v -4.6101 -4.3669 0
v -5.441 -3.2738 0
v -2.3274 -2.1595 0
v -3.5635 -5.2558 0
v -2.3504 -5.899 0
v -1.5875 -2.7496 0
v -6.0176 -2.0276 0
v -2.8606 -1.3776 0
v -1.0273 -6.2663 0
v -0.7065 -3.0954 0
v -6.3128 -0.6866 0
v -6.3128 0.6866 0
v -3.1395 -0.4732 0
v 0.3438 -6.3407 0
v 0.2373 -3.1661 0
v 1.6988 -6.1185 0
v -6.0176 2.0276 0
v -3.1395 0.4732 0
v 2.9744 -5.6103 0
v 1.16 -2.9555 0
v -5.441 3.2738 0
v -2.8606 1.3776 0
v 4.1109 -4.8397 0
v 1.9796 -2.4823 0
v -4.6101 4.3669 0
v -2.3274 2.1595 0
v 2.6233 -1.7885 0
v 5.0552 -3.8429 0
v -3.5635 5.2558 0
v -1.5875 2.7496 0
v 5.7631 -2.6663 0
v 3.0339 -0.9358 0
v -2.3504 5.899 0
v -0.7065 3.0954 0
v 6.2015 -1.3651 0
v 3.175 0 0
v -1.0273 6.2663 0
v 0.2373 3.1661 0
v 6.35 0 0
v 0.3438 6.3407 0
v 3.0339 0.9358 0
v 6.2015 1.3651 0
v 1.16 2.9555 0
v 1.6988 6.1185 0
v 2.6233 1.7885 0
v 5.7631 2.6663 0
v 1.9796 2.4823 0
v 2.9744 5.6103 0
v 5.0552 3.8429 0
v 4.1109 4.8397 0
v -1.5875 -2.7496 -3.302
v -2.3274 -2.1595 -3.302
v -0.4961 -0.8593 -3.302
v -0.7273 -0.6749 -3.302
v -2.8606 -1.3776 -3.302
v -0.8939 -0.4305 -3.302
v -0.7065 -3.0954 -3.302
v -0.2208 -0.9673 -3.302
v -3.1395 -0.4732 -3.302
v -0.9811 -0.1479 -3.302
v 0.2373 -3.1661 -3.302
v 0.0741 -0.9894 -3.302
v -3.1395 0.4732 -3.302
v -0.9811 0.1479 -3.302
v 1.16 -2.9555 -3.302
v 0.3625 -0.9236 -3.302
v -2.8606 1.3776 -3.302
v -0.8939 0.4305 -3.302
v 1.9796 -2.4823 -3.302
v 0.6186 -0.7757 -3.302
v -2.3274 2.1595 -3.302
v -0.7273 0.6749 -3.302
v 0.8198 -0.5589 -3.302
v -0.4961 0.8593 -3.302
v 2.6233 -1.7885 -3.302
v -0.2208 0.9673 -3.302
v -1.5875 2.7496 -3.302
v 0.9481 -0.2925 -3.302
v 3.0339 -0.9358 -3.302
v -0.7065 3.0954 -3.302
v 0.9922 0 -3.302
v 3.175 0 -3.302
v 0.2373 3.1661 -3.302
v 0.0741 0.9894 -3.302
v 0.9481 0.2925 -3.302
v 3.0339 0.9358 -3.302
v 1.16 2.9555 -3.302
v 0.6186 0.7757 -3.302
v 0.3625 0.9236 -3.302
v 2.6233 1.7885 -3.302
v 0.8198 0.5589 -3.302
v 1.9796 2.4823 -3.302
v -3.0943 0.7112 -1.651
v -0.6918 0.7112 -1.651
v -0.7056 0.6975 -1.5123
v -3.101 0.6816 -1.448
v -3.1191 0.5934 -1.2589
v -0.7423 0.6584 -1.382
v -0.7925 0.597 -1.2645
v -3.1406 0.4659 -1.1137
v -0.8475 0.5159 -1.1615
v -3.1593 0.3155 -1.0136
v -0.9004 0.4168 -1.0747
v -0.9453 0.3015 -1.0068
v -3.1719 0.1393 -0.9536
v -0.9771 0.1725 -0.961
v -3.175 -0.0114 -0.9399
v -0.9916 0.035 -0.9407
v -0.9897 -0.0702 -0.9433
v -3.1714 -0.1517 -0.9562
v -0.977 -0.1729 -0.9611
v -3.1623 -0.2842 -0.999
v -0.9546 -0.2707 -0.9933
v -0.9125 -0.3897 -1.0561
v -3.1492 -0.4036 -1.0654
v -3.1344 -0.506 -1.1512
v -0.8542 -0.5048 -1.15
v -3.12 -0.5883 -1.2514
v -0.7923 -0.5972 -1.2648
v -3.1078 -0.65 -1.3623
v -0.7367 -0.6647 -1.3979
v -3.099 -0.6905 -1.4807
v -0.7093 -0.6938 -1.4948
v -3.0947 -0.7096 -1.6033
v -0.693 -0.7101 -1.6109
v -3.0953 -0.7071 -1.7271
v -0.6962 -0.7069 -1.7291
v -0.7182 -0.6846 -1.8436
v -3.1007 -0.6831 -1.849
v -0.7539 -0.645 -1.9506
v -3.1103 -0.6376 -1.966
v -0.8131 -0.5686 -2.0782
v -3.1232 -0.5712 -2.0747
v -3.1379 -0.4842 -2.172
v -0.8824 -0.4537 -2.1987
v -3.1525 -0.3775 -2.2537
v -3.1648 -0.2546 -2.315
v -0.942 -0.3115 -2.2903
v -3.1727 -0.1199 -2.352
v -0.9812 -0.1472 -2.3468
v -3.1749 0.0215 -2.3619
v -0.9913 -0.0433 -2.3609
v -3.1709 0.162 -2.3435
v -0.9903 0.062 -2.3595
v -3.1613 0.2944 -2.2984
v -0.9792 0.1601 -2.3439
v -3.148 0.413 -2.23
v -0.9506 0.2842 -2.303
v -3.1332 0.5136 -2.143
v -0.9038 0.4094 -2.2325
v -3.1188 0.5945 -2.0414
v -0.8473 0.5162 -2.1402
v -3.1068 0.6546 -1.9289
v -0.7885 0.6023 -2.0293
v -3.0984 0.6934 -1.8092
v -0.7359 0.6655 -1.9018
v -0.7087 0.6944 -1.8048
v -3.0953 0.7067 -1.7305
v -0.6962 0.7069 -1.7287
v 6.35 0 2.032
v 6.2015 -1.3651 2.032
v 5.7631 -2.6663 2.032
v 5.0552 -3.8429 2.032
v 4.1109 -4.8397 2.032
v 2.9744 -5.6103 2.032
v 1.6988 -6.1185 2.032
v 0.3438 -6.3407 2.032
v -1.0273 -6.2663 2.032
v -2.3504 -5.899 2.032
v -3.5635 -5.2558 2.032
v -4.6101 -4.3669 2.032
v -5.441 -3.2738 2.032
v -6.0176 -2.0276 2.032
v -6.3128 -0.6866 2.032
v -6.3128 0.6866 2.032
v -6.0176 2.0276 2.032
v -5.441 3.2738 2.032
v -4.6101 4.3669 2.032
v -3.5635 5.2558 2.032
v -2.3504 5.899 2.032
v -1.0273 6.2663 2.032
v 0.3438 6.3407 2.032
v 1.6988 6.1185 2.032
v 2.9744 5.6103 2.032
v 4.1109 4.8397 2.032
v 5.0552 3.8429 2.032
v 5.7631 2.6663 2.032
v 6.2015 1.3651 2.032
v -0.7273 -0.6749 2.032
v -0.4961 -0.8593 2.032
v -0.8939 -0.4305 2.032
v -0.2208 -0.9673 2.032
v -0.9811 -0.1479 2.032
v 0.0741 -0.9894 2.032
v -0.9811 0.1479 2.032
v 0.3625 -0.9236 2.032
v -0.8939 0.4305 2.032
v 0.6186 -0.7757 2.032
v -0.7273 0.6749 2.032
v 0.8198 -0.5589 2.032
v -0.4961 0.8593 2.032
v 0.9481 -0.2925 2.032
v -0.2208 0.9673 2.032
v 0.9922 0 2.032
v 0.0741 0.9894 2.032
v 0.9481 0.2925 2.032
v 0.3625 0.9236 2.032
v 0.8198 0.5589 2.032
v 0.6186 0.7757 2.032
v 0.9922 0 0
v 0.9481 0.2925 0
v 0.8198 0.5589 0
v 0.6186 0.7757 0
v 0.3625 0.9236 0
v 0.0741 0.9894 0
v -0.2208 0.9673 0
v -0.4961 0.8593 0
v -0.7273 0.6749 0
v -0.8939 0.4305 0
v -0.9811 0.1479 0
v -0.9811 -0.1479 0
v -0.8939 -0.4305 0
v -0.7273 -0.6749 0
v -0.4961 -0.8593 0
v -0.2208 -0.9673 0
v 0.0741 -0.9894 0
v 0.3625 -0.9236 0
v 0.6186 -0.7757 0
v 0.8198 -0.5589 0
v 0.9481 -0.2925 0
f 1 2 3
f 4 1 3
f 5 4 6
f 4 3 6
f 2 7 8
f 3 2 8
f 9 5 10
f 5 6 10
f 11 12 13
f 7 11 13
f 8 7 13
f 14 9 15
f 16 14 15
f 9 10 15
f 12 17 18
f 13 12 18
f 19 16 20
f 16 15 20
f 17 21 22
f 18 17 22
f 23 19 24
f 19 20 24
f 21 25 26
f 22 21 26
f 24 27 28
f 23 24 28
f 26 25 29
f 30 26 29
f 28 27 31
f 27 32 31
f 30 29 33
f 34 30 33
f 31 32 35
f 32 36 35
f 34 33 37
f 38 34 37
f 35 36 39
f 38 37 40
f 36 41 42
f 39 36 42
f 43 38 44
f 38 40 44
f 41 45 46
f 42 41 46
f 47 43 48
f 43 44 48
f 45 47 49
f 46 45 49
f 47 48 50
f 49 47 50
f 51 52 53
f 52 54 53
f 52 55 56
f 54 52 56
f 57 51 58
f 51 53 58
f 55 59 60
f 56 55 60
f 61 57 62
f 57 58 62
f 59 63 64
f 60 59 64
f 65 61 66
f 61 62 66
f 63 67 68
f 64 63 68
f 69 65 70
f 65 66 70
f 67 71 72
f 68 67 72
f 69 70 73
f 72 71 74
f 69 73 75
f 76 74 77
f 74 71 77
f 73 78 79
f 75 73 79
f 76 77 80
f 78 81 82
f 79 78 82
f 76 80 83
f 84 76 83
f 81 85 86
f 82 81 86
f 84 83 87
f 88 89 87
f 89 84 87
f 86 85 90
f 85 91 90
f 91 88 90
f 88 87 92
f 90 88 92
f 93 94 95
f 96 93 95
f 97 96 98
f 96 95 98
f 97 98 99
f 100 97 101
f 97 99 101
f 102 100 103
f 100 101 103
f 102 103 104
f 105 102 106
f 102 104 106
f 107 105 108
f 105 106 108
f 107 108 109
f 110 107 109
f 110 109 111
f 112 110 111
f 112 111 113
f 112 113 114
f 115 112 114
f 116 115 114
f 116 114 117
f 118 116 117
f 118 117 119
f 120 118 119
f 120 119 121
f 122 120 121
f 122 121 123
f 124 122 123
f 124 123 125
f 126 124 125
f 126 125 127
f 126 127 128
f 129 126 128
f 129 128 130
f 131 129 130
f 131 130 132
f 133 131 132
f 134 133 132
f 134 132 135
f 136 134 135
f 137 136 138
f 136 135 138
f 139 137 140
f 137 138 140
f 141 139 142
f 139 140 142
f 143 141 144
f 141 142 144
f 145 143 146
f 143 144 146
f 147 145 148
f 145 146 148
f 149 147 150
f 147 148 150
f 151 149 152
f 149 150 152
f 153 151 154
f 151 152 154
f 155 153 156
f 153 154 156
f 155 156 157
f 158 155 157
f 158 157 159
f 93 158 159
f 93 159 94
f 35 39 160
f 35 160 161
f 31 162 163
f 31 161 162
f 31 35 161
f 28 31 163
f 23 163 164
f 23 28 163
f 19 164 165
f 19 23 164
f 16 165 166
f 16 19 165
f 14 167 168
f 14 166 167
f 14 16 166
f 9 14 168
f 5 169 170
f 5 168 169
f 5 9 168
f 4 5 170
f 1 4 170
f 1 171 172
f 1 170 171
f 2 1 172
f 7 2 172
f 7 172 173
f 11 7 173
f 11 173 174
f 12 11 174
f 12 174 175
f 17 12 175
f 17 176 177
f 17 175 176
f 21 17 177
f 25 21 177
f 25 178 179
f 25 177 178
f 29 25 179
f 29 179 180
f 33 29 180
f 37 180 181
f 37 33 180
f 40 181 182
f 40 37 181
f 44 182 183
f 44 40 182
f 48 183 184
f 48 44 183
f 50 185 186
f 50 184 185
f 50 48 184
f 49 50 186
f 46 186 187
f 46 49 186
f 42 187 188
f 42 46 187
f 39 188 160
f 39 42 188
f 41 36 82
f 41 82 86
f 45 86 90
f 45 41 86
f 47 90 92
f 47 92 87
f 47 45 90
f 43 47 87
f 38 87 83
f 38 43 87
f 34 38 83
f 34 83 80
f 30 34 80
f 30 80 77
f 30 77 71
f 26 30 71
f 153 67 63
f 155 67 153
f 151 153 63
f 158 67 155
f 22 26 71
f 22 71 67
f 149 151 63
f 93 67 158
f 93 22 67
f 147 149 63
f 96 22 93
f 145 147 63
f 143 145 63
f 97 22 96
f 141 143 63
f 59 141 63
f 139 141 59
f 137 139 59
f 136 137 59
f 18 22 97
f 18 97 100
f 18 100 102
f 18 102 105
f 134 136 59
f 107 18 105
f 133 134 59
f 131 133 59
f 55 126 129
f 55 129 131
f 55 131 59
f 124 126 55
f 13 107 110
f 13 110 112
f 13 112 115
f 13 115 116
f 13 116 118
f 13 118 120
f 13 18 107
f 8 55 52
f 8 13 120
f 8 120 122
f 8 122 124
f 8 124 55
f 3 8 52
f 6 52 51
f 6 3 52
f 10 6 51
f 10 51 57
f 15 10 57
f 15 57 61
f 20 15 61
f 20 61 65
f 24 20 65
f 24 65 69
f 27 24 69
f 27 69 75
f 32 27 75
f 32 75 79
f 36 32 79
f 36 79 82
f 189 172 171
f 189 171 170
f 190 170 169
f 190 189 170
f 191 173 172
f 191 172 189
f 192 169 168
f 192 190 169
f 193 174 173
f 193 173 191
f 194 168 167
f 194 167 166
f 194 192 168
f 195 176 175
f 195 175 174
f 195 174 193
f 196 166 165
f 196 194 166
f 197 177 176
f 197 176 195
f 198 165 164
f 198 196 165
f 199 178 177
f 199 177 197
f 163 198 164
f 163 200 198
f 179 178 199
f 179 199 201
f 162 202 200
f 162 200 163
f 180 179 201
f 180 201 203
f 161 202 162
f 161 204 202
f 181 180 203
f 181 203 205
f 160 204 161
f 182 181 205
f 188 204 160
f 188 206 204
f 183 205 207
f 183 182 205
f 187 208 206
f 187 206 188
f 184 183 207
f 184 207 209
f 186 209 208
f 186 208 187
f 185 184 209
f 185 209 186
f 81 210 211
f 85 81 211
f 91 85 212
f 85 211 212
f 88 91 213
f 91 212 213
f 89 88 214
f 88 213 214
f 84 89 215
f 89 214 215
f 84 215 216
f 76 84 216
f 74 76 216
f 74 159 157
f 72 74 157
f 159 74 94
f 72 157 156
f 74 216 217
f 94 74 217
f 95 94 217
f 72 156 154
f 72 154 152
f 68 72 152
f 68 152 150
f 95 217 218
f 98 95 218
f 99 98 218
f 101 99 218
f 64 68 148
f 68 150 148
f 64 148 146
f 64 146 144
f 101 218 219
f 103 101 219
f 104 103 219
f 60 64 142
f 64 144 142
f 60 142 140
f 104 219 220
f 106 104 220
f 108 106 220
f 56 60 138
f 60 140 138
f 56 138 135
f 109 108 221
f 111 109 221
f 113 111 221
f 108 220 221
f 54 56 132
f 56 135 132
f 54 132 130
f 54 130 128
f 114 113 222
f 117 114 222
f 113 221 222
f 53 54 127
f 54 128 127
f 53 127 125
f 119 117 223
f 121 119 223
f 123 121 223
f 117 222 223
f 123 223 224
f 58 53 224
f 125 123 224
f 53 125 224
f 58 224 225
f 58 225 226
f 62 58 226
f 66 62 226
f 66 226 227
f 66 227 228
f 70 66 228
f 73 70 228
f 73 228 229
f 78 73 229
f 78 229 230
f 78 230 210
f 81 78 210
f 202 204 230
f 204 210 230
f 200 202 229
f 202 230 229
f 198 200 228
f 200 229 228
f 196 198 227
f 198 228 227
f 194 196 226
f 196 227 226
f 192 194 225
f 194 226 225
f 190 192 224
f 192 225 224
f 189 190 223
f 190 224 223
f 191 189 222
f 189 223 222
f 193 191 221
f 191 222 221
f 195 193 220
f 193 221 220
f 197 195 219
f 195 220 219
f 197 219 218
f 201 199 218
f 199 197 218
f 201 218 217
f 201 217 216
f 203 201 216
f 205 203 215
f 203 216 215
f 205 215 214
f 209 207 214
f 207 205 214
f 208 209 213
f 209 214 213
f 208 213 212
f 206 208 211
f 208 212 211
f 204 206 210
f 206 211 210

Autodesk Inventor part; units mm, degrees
ref_plane "YZ Plane" through (0, 0, 0) normal (1, 0, 0) x (0, 1, 0)
ref_plane "XZ Plane" through (0, 0, 0) normal (0, 1, 0) x (-1, 0, 0)
ref_plane "XY Plane" through (0, 0, 0) normal (0, 0, 1) x (1, 0, 0)
sketch "Sketch1" plane through (0, 0, 0) normal (0, 0, 1) x (1, 0, 0)
  circle A0 centre (0, 0) radius 6.35
  circle A1 centre (0, 0) radius 3.175
  circle A2 centre (0, 0) radius 0.9922
  dimension "d0" = 12.7
  dimension "d1" = 6.35
  dimension "d2" = 1.9844
extrude "Extrusion1" add sketch "Sketch1" along normal blind 2.032 contours A0 | A1
extrude "Extrusion2" add sketch "Sketch1" against normal blind 3.302 contours A1
sketch "Sketch2" plane through (0, 0, 0) normal (1, 0, 0) x (0, 1, 0)
  circle A0 centre (0, -1.651) radius 0.7112
  line L0 (-3.175, -3.302) -> (3.175, -3.302) projected
  point P0 (0, 0)
  dimension "d7" = 1.4224
  dimension "d8" = 1.651
extrude "Extrusion3" cut sketch "Sketch2" against normal blind 3.302
properties part number "Flywheel"
